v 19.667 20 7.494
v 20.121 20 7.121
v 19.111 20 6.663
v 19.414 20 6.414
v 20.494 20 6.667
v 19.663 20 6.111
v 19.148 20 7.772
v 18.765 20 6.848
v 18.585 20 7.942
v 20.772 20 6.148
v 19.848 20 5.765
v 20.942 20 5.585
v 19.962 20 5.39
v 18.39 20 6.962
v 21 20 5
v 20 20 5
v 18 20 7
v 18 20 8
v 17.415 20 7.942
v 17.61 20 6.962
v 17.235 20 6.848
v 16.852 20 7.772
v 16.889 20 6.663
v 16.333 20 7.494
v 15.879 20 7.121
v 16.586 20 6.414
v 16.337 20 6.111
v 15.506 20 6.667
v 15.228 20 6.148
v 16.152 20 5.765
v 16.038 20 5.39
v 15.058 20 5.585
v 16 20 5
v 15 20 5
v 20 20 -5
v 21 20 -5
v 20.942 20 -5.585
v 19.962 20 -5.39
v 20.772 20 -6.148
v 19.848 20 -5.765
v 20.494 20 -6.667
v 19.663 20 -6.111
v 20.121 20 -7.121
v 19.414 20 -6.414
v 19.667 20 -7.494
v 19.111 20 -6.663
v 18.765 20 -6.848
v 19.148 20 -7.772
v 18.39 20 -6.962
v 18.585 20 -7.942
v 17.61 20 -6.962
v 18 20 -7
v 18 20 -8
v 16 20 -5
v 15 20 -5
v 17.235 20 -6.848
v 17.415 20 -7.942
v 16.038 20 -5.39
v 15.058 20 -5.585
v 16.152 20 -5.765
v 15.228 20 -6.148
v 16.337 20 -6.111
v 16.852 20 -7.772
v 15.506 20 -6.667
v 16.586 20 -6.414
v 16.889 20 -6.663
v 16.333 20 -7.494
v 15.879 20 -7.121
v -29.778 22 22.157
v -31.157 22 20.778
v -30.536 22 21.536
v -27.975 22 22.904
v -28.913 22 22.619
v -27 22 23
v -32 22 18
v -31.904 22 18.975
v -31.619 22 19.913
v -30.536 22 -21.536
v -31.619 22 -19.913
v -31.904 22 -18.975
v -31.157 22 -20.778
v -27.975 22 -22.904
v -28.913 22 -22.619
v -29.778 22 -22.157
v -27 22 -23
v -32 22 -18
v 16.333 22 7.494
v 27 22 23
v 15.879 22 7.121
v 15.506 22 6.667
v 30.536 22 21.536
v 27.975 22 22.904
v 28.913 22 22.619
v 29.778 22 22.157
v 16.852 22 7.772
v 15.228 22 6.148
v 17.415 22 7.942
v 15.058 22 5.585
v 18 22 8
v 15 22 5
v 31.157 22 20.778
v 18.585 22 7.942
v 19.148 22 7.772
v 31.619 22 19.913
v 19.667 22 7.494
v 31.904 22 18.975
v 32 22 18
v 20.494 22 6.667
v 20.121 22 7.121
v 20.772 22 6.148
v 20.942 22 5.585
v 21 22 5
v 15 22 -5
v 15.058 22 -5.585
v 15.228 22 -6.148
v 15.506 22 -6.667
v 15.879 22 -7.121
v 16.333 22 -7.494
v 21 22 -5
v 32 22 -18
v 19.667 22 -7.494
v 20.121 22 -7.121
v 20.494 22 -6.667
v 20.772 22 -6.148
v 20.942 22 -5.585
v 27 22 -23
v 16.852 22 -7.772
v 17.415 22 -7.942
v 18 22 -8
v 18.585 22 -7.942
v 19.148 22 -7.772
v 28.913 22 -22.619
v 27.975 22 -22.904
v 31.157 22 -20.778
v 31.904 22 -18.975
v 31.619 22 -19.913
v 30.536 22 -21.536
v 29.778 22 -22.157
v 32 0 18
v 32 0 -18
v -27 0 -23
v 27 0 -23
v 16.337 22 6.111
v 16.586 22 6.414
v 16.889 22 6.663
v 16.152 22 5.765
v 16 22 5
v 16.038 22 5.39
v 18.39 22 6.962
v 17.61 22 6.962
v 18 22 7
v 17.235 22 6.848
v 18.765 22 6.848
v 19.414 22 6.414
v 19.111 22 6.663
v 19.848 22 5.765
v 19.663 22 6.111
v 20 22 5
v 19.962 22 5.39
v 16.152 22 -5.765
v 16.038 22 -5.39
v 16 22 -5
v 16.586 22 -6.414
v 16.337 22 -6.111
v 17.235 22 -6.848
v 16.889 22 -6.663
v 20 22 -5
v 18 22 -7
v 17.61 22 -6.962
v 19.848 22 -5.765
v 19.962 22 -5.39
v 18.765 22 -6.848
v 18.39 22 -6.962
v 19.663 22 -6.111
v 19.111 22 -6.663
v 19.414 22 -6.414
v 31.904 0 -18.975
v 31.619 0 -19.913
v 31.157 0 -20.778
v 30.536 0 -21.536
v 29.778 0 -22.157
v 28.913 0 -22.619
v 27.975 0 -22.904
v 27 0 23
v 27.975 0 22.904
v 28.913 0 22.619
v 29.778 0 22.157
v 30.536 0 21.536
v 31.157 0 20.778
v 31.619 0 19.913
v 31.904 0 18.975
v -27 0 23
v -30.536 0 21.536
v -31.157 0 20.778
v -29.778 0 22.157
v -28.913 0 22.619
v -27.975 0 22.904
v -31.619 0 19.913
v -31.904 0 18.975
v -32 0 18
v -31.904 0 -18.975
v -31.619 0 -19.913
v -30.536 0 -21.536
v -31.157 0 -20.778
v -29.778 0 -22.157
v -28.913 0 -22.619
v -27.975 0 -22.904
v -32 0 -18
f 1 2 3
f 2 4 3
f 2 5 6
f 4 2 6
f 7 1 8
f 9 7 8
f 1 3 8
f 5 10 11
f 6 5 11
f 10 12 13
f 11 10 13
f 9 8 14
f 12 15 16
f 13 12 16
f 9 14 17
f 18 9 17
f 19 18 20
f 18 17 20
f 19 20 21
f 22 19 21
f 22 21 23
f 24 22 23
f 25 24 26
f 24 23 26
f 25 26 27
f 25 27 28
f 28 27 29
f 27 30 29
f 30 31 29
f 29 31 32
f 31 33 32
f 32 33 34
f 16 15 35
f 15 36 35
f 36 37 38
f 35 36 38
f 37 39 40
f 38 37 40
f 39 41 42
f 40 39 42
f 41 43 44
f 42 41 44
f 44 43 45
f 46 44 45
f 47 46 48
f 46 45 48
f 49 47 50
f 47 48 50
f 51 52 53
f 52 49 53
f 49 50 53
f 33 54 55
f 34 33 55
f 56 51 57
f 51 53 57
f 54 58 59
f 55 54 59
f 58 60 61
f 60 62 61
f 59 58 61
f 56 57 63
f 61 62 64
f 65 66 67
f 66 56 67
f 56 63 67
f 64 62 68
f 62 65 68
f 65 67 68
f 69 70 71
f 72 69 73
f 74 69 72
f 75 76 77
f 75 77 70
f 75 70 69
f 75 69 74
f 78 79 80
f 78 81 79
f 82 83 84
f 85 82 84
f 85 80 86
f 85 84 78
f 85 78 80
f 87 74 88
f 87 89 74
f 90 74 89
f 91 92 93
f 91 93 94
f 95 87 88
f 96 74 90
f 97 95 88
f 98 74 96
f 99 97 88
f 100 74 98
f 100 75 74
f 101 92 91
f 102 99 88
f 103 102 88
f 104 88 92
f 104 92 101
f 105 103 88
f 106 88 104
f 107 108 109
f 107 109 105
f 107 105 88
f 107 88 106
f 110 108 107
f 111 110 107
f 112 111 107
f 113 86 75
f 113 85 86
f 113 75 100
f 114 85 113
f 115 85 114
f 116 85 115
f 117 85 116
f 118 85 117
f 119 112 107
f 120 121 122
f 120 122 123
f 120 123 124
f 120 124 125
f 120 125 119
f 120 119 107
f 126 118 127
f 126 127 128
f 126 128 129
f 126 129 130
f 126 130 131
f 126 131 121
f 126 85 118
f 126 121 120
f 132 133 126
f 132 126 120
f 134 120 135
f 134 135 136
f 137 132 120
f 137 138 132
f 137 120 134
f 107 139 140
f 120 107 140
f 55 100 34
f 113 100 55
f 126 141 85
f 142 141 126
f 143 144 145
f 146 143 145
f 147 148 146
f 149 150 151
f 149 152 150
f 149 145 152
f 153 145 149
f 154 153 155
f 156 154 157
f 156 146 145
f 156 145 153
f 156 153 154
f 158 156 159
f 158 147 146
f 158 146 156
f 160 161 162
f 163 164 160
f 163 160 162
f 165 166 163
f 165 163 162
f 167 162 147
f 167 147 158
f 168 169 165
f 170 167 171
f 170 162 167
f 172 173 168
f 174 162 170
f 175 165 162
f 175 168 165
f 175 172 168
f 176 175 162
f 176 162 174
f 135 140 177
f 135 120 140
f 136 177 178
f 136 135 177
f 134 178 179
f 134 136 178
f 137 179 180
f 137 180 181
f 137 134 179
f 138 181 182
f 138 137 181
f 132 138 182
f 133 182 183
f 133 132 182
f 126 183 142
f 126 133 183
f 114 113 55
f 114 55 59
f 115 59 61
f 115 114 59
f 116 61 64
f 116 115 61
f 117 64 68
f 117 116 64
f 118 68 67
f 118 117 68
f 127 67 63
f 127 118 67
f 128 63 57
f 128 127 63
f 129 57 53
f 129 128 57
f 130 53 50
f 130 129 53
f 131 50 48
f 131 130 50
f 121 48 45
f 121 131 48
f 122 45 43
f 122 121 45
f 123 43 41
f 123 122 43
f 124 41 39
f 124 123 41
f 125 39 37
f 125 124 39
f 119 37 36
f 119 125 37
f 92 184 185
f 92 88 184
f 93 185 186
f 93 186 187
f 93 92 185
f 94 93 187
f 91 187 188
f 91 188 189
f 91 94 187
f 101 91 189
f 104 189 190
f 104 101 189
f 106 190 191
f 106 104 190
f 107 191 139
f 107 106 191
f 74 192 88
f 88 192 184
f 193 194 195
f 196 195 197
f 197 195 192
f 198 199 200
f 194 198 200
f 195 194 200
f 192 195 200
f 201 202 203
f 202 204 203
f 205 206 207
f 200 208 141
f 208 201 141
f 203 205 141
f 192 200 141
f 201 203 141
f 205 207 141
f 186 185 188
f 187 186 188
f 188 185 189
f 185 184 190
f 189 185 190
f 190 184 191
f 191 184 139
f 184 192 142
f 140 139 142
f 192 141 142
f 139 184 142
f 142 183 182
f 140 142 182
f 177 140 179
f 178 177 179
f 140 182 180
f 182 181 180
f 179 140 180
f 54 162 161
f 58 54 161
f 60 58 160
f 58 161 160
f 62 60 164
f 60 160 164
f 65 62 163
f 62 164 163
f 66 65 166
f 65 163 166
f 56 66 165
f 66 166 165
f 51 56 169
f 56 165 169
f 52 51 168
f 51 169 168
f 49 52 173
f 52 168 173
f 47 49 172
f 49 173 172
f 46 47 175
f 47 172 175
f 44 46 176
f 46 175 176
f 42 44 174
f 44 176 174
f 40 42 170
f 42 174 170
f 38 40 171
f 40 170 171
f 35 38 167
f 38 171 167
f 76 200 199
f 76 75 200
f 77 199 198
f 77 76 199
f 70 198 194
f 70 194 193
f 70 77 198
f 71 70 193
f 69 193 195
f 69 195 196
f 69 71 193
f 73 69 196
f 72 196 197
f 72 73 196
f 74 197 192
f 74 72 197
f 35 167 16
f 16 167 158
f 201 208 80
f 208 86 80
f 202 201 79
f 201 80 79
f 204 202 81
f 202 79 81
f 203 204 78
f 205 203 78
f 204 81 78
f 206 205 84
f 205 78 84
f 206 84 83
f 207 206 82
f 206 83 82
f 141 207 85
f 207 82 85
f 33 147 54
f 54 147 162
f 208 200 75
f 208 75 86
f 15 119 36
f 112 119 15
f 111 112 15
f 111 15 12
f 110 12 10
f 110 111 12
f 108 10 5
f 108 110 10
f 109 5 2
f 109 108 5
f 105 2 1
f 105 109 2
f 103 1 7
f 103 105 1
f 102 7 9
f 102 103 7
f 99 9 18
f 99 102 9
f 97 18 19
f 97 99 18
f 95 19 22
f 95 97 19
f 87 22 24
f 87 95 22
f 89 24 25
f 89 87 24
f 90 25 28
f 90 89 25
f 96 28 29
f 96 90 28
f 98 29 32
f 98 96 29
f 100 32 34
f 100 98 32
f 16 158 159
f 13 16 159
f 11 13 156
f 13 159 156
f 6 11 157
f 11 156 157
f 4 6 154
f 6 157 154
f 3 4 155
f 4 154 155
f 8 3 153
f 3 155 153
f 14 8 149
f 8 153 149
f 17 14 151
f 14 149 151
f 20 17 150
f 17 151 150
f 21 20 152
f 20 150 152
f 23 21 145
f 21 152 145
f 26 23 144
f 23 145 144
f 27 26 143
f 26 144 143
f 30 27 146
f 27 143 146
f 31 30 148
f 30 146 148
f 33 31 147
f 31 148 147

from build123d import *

# Parameters (mm, degrees)
SKETCH_1_W          = 64
SKETCH_1_H          = 46
EXTRUDE_1_DEPTH     = 22
FILLET_1_R          = 5
CUT_EXTRUDE_1_DEPTH = 2


with BuildPart() as part:
    # 草图1 → 凸台-拉伸1 (new body)
    with BuildSketch(Plane(origin=(0, 0, 0), x_dir=(1, 0, 0), z_dir=(0, 1, 0))):
        Rectangle(SKETCH_1_W, SKETCH_1_H)
    extrude(amount=EXTRUDE_1_DEPTH)

    # 圆角1
    fillet_1_edges = [part.edges().sort_by_distance(p)[0] for p in [
        (32, 11, 23),
        (-32, 11, 23),
        (-32, 11, -23),
        (32, 11, -23),
    ]]
    fillet(fillet_1_edges, radius=FILLET_1_R)

    # 草图2 → 切除-拉伸1 (cut)
    with BuildSketch(Plane(origin=(0, 22, 0), x_dir=(1, 0, 0), z_dir=(0, 1, 0))):
        with BuildLine():
            Line((15, -5), (15, 5))
            ThreePointArc((15, 5), (18, 8), (21, 5))
            Line((21, 5), (21, -5))
            ThreePointArc((21, -5), (18, -8), (15, -5))
        make_face()
        with BuildLine():
            Line((16, -5), (16, 5))
            ThreePointArc((16, 5), (18, 7), (20, 5))
            Line((20, 5), (20, -5))
            ThreePointArc((20, -5), (18, -7), (16, -5))
        make_face(mode=Mode.SUBTRACT)
    extrude(amount=-CUT_EXTRUDE_1_DEPTH, mode=Mode.SUBTRACT)


solid = part.part
